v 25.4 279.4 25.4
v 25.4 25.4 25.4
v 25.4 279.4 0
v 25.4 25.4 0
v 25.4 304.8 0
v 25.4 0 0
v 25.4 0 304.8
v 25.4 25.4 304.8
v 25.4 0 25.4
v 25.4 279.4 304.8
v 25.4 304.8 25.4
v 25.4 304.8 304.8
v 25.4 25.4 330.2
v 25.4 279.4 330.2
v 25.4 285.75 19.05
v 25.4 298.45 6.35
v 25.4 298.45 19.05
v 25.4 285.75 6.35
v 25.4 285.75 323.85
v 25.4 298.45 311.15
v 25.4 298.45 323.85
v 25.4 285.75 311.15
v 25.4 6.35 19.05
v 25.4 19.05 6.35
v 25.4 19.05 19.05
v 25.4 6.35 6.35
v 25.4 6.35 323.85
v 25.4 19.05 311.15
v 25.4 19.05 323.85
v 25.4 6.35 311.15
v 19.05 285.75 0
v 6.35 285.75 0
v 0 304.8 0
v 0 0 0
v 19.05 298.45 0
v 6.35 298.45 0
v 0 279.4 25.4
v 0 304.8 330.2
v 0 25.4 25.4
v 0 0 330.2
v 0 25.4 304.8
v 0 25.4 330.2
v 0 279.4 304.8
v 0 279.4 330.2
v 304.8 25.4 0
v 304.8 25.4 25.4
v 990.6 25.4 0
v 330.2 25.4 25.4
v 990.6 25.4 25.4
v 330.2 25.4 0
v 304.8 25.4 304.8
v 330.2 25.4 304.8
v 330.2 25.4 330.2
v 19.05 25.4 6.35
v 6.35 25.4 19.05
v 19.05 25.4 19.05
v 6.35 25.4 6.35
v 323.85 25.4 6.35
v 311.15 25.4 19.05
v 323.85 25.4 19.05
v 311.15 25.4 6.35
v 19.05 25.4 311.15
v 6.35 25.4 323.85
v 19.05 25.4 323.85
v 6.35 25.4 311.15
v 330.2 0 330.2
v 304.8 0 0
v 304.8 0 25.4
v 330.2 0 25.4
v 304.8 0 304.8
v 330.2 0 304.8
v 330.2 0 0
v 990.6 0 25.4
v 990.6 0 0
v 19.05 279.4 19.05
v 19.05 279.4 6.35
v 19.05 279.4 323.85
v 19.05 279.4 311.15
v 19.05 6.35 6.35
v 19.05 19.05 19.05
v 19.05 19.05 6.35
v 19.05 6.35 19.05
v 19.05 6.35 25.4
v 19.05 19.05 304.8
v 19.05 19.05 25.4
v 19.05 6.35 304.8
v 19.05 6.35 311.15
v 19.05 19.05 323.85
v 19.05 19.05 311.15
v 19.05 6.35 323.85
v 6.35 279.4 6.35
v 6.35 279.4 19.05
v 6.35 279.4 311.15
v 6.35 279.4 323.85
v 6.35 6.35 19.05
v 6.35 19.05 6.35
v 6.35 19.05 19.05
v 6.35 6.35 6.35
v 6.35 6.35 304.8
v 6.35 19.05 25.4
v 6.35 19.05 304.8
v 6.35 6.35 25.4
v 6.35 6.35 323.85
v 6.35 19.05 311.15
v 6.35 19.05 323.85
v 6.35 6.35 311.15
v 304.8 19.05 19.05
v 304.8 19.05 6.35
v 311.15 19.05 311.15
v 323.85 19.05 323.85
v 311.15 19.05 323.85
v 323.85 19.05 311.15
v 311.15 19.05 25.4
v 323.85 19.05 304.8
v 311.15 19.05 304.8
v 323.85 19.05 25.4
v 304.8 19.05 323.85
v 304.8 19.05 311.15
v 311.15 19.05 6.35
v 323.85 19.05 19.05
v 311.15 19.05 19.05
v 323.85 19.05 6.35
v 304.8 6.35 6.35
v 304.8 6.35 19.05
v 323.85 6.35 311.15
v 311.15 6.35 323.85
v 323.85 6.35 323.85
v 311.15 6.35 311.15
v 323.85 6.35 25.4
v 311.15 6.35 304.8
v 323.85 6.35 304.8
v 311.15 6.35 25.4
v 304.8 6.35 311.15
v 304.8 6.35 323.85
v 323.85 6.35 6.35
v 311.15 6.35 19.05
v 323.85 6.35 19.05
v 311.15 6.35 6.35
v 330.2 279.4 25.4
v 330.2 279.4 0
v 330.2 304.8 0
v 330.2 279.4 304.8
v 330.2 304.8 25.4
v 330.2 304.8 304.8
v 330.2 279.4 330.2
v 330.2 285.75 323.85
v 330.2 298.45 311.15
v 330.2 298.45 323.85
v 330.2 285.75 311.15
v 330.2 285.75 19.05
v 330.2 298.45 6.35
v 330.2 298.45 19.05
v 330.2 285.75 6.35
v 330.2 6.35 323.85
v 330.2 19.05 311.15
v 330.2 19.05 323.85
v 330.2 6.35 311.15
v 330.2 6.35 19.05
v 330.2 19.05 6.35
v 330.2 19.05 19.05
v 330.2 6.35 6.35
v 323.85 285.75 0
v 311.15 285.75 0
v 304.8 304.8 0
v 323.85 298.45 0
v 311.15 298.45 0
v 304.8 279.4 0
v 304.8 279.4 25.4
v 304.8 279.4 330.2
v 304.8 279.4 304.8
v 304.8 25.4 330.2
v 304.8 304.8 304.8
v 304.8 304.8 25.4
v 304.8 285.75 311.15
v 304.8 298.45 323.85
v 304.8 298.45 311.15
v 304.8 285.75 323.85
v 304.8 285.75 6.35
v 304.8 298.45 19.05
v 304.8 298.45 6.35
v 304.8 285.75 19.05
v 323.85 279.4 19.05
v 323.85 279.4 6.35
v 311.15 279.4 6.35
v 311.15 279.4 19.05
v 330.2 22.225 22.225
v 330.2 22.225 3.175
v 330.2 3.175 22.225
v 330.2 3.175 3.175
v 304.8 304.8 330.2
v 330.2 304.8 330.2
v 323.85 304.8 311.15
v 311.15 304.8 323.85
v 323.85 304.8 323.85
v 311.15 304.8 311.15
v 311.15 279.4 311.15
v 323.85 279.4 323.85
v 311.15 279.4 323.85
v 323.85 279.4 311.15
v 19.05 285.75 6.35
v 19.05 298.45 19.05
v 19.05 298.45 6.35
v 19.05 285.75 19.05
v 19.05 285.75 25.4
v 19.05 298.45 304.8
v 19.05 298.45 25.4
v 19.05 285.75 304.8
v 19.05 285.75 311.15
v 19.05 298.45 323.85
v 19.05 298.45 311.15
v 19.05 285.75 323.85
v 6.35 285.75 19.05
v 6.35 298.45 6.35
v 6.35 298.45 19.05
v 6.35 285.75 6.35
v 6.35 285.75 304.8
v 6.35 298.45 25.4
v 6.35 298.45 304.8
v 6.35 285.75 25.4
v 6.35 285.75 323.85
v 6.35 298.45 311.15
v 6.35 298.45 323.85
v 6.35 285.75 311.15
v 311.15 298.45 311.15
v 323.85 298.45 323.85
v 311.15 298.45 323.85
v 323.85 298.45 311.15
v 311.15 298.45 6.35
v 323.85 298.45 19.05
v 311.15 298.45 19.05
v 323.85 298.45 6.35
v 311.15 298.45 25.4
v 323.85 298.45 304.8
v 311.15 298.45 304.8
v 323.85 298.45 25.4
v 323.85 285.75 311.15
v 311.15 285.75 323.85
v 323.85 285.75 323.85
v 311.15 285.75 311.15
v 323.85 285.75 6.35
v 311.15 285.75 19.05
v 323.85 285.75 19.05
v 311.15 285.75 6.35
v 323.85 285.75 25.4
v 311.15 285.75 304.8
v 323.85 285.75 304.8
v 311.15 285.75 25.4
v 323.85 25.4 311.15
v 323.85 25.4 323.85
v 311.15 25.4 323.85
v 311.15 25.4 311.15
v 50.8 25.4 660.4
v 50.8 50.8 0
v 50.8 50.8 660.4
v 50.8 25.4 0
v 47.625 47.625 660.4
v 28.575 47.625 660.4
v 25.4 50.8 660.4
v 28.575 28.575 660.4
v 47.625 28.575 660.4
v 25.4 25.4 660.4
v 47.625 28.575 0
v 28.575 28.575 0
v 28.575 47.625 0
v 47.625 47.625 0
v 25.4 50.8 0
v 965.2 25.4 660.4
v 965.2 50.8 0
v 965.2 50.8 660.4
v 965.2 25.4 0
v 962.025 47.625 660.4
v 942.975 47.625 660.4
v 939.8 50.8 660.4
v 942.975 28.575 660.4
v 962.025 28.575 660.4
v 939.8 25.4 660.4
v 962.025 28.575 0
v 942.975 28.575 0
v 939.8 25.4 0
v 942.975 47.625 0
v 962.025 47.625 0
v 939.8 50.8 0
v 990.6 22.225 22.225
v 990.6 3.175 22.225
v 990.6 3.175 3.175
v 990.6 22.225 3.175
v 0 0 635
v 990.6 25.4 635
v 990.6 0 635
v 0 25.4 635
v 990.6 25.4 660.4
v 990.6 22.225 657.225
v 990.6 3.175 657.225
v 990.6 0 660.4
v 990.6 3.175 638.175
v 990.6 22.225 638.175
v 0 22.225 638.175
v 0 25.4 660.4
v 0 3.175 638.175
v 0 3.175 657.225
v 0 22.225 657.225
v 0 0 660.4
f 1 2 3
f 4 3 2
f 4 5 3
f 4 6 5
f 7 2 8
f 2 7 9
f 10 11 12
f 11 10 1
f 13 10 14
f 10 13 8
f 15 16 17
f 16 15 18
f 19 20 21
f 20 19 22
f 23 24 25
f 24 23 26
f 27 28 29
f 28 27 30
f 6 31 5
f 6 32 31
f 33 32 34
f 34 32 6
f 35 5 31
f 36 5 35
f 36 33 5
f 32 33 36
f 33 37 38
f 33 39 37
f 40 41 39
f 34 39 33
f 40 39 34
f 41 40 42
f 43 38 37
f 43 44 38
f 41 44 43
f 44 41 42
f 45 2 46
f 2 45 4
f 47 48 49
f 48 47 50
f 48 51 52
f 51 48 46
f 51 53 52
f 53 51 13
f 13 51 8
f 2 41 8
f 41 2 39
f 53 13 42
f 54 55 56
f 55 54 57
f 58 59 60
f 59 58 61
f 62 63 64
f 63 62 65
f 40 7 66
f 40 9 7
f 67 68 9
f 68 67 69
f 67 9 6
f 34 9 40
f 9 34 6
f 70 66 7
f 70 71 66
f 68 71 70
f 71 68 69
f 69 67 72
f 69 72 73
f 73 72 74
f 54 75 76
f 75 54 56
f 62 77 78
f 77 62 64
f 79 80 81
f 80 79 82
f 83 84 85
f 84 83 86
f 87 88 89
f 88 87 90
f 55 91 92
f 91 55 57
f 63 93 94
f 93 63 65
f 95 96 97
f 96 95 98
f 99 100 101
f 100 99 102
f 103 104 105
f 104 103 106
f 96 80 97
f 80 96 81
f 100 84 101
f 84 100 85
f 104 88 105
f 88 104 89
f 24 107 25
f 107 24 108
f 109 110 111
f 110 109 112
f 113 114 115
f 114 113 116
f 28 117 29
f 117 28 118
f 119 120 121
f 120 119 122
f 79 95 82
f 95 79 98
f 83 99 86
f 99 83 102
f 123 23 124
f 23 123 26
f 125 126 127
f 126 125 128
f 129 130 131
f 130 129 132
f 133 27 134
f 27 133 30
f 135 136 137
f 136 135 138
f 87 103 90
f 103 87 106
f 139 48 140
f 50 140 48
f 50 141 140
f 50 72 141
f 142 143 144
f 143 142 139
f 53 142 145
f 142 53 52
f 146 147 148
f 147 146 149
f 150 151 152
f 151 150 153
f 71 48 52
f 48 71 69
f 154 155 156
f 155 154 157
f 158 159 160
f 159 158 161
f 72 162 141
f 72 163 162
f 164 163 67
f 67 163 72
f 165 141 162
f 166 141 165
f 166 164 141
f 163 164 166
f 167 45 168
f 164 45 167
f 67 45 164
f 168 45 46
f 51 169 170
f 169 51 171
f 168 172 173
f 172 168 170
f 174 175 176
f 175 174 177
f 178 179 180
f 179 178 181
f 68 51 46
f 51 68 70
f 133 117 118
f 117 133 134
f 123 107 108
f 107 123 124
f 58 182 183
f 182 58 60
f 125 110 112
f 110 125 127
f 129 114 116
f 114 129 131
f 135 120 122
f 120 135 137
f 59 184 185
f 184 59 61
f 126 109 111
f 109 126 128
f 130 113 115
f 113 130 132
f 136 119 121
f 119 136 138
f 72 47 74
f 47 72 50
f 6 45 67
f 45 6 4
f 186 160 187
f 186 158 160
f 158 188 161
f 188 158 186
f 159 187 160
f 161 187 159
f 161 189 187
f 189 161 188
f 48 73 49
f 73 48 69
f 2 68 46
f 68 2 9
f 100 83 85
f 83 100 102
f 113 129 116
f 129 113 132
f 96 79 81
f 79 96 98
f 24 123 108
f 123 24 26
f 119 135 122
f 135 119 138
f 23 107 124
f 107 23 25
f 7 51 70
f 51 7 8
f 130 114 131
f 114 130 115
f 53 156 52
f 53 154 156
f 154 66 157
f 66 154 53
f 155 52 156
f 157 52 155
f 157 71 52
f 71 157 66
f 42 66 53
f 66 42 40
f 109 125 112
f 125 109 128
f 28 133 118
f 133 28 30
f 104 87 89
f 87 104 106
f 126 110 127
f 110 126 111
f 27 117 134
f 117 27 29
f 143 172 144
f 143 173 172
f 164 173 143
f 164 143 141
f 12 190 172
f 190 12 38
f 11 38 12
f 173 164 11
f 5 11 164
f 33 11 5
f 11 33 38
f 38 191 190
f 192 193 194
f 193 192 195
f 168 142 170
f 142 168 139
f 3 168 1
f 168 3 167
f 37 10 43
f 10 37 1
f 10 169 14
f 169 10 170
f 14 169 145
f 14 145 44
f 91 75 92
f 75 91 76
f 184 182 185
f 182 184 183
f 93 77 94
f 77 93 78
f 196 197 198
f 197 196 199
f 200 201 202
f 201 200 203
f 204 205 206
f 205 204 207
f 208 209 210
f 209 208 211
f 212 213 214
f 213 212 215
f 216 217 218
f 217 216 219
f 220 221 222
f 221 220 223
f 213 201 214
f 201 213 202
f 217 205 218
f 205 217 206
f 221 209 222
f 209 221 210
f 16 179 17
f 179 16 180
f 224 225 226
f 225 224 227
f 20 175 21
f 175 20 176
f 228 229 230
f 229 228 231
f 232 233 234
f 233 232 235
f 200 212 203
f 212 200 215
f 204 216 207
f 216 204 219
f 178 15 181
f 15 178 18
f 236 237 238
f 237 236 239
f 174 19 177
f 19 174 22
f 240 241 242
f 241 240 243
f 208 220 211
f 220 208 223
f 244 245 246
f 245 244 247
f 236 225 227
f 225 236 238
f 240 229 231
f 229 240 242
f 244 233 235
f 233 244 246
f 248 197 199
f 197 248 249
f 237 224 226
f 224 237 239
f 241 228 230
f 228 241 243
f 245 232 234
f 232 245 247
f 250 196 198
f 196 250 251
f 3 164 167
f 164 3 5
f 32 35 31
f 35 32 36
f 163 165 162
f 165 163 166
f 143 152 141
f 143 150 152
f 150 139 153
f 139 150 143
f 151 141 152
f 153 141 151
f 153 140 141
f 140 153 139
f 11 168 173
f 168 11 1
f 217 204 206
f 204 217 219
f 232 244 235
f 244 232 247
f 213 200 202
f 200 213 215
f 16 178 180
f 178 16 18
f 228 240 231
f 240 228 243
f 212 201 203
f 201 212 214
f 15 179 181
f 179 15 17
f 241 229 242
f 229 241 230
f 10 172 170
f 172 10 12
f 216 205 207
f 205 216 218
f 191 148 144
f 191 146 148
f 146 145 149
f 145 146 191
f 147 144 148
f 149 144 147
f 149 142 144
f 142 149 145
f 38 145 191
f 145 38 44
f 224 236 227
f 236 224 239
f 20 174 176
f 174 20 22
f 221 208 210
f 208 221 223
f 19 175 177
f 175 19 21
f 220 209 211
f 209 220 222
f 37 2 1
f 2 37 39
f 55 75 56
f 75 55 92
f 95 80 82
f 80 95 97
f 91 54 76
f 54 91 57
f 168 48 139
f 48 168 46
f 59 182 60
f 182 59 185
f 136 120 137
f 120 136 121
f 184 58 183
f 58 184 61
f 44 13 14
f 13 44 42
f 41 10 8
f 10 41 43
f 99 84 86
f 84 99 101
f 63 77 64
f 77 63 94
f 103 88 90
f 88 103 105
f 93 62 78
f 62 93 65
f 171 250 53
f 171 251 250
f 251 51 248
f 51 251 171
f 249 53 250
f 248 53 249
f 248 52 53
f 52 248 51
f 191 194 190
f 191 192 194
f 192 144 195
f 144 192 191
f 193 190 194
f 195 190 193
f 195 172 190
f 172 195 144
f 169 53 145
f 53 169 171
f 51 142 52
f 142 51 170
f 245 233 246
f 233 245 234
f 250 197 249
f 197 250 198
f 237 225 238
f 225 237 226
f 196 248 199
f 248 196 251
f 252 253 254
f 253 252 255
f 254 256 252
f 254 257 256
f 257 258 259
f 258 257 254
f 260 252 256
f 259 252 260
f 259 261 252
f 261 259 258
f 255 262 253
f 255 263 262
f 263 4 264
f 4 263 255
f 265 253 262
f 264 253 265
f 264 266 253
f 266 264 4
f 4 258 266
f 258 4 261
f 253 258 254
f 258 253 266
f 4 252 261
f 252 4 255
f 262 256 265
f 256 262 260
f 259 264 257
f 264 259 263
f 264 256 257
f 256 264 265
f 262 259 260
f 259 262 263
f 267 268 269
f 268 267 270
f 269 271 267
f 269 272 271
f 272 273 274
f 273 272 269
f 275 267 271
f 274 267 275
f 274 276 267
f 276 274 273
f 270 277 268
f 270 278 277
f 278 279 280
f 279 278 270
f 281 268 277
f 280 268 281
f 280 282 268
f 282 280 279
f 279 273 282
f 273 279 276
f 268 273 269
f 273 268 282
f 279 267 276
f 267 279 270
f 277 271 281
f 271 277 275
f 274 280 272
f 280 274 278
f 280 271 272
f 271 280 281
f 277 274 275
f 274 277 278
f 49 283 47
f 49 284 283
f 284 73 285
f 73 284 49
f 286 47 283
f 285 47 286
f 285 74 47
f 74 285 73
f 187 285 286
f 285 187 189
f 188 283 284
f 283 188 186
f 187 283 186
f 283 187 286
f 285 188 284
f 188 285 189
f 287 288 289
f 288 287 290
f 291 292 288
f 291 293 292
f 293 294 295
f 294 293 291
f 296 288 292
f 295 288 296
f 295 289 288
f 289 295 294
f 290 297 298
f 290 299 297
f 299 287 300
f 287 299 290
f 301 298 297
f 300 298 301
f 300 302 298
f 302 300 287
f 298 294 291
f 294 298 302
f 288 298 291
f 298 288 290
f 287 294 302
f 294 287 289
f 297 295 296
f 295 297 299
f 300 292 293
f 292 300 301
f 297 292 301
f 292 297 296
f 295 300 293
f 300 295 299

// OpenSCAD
// file: square_tube.scad
// Function to create a hollow square tube (wireframe edge)
module square_tube(length, OD, wall_thickness) {
    difference() {
        // Outer square tube (solid)
        cube([OD, OD, length], center=false);
        
        // Inner hollow cutout (subtracts from outer)
        translate([wall_thickness, wall_thickness, 0])
            cube([OD - 2 * wall_thickness, OD - 2 * wall_thickness, length], center=false);
    }
}
// file: crate.scad
// Convert inches to millimeters
inch = 25.4;
OD = 1 * inch;        // Outer dimension (OD) of 1 inch for the wireframe tubes
crate_width = 13 * inch;   // 13 inch width
crate_length = 13 * inch;  // 13 inch length
crate_height = 11 * inch;  // 11 inch height
wall_thickness = 1/4 * inch;  // Thickness of the wireframe bars



use <square_tube.scad>;  // Import the square_tube module from square_tube.scad

module square_base(x,y,z) {
    translate([x, y, z]) square_tube(crate_length, OD, wall_thickness);
    translate([x + crate_length - OD, y, z]) square_tube(crate_width, OD, wall_thickness);
    translate([x, y, z + OD]) rotate([0,90,0]) square_tube(crate_length, OD, wall_thickness);
    translate([x,y,z+crate_width]) rotate([0,90,0]) square_tube(crate_width, OD, wall_thickness);
}

// Function to generate the wireframe of a cube
module crate() {

    // Bottom square
    square_base(0,0,0);

    // Top square
    square_base(0,crate_width-2*OD,0);

    // Vertical edges (from bottom to top)
    translate([0, crate_length-2*OD, 0]) rotate([90, 0, 0]) square_tube(crate_height, OD, wall_thickness);
    translate([crate_length - OD, crate_length-2*OD, 0]) rotate([90, 0, 0]) square_tube(crate_height, OD, wall_thickness);
    translate([0, crate_length-2*OD, crate_length-OD]) rotate([90, 0, 0]) square_tube(crate_height, OD, wall_thickness);
    translate([crate_length - OD, crate_length-OD, crate_length-OD]) rotate([90, 0, 0]) square_tube(crate_height, OD, wall_thickness);


}

// Call the wireframe crate module
crate();
// main file
// Convert inches to millimeters
inch = 25.4;
OD = 1 * inch;         // Outer dimension (OD) of 1 inch for the square tube
wall_thickness = 1/8 * inch;  // Wall thickness of 1/8 inch
length = 13 * inch * 3;   // Longer side of the rectangle (L = 13 inches * 3)
width = 13 * inch * 2;    // Shorter side of the rectangle (W = 13 inches * 2)

// Function to create a hollow square tube with specified length
module square_tube(length) {
    difference() {
        // Outer square tube (solid)
        cube([OD, OD, length], center=false);
        
        // Inner hollow cutout (subtracts from outer)
        translate([wall_thickness, wall_thickness, 0])
            cube([OD - 2*wall_thickness, OD - 2*wall_thickness, length], center=false);
    }
}

use <crate.scad>;  // Import the crate module from crate.scad
crate();           // Call the crate module to generate the wireframe crate

// First square tube along the z-axis (shorter side, W)
translate([OD, OD, 0])  // Offset to align along the Z-axis
    square_tube(width); 

// Second square tube, offset along the x-axis by the length (L)
translate([length - 2*OD, OD, 0])  // Offset to align with the longer side
    square_tube(width);

// Third square tube along the x-axis (longer side, L), positioned on the ZY plane
translate([0, 0, OD])    // Offset to align along the Z-axis
    rotate([0, 90, 0])   // Rotate 90 degrees to align the tube along the X-axis
    square_tube(length);

// Fourth square tube along the x-axis (longer side, L), offset in the Z direction by the width
translate([0, 0, width])  // Offset along the Z-axis by the width
    rotate([0, 90, 0])    // Rotate 90 degrees to align the tube along the X-axis
    square_tube(length);
